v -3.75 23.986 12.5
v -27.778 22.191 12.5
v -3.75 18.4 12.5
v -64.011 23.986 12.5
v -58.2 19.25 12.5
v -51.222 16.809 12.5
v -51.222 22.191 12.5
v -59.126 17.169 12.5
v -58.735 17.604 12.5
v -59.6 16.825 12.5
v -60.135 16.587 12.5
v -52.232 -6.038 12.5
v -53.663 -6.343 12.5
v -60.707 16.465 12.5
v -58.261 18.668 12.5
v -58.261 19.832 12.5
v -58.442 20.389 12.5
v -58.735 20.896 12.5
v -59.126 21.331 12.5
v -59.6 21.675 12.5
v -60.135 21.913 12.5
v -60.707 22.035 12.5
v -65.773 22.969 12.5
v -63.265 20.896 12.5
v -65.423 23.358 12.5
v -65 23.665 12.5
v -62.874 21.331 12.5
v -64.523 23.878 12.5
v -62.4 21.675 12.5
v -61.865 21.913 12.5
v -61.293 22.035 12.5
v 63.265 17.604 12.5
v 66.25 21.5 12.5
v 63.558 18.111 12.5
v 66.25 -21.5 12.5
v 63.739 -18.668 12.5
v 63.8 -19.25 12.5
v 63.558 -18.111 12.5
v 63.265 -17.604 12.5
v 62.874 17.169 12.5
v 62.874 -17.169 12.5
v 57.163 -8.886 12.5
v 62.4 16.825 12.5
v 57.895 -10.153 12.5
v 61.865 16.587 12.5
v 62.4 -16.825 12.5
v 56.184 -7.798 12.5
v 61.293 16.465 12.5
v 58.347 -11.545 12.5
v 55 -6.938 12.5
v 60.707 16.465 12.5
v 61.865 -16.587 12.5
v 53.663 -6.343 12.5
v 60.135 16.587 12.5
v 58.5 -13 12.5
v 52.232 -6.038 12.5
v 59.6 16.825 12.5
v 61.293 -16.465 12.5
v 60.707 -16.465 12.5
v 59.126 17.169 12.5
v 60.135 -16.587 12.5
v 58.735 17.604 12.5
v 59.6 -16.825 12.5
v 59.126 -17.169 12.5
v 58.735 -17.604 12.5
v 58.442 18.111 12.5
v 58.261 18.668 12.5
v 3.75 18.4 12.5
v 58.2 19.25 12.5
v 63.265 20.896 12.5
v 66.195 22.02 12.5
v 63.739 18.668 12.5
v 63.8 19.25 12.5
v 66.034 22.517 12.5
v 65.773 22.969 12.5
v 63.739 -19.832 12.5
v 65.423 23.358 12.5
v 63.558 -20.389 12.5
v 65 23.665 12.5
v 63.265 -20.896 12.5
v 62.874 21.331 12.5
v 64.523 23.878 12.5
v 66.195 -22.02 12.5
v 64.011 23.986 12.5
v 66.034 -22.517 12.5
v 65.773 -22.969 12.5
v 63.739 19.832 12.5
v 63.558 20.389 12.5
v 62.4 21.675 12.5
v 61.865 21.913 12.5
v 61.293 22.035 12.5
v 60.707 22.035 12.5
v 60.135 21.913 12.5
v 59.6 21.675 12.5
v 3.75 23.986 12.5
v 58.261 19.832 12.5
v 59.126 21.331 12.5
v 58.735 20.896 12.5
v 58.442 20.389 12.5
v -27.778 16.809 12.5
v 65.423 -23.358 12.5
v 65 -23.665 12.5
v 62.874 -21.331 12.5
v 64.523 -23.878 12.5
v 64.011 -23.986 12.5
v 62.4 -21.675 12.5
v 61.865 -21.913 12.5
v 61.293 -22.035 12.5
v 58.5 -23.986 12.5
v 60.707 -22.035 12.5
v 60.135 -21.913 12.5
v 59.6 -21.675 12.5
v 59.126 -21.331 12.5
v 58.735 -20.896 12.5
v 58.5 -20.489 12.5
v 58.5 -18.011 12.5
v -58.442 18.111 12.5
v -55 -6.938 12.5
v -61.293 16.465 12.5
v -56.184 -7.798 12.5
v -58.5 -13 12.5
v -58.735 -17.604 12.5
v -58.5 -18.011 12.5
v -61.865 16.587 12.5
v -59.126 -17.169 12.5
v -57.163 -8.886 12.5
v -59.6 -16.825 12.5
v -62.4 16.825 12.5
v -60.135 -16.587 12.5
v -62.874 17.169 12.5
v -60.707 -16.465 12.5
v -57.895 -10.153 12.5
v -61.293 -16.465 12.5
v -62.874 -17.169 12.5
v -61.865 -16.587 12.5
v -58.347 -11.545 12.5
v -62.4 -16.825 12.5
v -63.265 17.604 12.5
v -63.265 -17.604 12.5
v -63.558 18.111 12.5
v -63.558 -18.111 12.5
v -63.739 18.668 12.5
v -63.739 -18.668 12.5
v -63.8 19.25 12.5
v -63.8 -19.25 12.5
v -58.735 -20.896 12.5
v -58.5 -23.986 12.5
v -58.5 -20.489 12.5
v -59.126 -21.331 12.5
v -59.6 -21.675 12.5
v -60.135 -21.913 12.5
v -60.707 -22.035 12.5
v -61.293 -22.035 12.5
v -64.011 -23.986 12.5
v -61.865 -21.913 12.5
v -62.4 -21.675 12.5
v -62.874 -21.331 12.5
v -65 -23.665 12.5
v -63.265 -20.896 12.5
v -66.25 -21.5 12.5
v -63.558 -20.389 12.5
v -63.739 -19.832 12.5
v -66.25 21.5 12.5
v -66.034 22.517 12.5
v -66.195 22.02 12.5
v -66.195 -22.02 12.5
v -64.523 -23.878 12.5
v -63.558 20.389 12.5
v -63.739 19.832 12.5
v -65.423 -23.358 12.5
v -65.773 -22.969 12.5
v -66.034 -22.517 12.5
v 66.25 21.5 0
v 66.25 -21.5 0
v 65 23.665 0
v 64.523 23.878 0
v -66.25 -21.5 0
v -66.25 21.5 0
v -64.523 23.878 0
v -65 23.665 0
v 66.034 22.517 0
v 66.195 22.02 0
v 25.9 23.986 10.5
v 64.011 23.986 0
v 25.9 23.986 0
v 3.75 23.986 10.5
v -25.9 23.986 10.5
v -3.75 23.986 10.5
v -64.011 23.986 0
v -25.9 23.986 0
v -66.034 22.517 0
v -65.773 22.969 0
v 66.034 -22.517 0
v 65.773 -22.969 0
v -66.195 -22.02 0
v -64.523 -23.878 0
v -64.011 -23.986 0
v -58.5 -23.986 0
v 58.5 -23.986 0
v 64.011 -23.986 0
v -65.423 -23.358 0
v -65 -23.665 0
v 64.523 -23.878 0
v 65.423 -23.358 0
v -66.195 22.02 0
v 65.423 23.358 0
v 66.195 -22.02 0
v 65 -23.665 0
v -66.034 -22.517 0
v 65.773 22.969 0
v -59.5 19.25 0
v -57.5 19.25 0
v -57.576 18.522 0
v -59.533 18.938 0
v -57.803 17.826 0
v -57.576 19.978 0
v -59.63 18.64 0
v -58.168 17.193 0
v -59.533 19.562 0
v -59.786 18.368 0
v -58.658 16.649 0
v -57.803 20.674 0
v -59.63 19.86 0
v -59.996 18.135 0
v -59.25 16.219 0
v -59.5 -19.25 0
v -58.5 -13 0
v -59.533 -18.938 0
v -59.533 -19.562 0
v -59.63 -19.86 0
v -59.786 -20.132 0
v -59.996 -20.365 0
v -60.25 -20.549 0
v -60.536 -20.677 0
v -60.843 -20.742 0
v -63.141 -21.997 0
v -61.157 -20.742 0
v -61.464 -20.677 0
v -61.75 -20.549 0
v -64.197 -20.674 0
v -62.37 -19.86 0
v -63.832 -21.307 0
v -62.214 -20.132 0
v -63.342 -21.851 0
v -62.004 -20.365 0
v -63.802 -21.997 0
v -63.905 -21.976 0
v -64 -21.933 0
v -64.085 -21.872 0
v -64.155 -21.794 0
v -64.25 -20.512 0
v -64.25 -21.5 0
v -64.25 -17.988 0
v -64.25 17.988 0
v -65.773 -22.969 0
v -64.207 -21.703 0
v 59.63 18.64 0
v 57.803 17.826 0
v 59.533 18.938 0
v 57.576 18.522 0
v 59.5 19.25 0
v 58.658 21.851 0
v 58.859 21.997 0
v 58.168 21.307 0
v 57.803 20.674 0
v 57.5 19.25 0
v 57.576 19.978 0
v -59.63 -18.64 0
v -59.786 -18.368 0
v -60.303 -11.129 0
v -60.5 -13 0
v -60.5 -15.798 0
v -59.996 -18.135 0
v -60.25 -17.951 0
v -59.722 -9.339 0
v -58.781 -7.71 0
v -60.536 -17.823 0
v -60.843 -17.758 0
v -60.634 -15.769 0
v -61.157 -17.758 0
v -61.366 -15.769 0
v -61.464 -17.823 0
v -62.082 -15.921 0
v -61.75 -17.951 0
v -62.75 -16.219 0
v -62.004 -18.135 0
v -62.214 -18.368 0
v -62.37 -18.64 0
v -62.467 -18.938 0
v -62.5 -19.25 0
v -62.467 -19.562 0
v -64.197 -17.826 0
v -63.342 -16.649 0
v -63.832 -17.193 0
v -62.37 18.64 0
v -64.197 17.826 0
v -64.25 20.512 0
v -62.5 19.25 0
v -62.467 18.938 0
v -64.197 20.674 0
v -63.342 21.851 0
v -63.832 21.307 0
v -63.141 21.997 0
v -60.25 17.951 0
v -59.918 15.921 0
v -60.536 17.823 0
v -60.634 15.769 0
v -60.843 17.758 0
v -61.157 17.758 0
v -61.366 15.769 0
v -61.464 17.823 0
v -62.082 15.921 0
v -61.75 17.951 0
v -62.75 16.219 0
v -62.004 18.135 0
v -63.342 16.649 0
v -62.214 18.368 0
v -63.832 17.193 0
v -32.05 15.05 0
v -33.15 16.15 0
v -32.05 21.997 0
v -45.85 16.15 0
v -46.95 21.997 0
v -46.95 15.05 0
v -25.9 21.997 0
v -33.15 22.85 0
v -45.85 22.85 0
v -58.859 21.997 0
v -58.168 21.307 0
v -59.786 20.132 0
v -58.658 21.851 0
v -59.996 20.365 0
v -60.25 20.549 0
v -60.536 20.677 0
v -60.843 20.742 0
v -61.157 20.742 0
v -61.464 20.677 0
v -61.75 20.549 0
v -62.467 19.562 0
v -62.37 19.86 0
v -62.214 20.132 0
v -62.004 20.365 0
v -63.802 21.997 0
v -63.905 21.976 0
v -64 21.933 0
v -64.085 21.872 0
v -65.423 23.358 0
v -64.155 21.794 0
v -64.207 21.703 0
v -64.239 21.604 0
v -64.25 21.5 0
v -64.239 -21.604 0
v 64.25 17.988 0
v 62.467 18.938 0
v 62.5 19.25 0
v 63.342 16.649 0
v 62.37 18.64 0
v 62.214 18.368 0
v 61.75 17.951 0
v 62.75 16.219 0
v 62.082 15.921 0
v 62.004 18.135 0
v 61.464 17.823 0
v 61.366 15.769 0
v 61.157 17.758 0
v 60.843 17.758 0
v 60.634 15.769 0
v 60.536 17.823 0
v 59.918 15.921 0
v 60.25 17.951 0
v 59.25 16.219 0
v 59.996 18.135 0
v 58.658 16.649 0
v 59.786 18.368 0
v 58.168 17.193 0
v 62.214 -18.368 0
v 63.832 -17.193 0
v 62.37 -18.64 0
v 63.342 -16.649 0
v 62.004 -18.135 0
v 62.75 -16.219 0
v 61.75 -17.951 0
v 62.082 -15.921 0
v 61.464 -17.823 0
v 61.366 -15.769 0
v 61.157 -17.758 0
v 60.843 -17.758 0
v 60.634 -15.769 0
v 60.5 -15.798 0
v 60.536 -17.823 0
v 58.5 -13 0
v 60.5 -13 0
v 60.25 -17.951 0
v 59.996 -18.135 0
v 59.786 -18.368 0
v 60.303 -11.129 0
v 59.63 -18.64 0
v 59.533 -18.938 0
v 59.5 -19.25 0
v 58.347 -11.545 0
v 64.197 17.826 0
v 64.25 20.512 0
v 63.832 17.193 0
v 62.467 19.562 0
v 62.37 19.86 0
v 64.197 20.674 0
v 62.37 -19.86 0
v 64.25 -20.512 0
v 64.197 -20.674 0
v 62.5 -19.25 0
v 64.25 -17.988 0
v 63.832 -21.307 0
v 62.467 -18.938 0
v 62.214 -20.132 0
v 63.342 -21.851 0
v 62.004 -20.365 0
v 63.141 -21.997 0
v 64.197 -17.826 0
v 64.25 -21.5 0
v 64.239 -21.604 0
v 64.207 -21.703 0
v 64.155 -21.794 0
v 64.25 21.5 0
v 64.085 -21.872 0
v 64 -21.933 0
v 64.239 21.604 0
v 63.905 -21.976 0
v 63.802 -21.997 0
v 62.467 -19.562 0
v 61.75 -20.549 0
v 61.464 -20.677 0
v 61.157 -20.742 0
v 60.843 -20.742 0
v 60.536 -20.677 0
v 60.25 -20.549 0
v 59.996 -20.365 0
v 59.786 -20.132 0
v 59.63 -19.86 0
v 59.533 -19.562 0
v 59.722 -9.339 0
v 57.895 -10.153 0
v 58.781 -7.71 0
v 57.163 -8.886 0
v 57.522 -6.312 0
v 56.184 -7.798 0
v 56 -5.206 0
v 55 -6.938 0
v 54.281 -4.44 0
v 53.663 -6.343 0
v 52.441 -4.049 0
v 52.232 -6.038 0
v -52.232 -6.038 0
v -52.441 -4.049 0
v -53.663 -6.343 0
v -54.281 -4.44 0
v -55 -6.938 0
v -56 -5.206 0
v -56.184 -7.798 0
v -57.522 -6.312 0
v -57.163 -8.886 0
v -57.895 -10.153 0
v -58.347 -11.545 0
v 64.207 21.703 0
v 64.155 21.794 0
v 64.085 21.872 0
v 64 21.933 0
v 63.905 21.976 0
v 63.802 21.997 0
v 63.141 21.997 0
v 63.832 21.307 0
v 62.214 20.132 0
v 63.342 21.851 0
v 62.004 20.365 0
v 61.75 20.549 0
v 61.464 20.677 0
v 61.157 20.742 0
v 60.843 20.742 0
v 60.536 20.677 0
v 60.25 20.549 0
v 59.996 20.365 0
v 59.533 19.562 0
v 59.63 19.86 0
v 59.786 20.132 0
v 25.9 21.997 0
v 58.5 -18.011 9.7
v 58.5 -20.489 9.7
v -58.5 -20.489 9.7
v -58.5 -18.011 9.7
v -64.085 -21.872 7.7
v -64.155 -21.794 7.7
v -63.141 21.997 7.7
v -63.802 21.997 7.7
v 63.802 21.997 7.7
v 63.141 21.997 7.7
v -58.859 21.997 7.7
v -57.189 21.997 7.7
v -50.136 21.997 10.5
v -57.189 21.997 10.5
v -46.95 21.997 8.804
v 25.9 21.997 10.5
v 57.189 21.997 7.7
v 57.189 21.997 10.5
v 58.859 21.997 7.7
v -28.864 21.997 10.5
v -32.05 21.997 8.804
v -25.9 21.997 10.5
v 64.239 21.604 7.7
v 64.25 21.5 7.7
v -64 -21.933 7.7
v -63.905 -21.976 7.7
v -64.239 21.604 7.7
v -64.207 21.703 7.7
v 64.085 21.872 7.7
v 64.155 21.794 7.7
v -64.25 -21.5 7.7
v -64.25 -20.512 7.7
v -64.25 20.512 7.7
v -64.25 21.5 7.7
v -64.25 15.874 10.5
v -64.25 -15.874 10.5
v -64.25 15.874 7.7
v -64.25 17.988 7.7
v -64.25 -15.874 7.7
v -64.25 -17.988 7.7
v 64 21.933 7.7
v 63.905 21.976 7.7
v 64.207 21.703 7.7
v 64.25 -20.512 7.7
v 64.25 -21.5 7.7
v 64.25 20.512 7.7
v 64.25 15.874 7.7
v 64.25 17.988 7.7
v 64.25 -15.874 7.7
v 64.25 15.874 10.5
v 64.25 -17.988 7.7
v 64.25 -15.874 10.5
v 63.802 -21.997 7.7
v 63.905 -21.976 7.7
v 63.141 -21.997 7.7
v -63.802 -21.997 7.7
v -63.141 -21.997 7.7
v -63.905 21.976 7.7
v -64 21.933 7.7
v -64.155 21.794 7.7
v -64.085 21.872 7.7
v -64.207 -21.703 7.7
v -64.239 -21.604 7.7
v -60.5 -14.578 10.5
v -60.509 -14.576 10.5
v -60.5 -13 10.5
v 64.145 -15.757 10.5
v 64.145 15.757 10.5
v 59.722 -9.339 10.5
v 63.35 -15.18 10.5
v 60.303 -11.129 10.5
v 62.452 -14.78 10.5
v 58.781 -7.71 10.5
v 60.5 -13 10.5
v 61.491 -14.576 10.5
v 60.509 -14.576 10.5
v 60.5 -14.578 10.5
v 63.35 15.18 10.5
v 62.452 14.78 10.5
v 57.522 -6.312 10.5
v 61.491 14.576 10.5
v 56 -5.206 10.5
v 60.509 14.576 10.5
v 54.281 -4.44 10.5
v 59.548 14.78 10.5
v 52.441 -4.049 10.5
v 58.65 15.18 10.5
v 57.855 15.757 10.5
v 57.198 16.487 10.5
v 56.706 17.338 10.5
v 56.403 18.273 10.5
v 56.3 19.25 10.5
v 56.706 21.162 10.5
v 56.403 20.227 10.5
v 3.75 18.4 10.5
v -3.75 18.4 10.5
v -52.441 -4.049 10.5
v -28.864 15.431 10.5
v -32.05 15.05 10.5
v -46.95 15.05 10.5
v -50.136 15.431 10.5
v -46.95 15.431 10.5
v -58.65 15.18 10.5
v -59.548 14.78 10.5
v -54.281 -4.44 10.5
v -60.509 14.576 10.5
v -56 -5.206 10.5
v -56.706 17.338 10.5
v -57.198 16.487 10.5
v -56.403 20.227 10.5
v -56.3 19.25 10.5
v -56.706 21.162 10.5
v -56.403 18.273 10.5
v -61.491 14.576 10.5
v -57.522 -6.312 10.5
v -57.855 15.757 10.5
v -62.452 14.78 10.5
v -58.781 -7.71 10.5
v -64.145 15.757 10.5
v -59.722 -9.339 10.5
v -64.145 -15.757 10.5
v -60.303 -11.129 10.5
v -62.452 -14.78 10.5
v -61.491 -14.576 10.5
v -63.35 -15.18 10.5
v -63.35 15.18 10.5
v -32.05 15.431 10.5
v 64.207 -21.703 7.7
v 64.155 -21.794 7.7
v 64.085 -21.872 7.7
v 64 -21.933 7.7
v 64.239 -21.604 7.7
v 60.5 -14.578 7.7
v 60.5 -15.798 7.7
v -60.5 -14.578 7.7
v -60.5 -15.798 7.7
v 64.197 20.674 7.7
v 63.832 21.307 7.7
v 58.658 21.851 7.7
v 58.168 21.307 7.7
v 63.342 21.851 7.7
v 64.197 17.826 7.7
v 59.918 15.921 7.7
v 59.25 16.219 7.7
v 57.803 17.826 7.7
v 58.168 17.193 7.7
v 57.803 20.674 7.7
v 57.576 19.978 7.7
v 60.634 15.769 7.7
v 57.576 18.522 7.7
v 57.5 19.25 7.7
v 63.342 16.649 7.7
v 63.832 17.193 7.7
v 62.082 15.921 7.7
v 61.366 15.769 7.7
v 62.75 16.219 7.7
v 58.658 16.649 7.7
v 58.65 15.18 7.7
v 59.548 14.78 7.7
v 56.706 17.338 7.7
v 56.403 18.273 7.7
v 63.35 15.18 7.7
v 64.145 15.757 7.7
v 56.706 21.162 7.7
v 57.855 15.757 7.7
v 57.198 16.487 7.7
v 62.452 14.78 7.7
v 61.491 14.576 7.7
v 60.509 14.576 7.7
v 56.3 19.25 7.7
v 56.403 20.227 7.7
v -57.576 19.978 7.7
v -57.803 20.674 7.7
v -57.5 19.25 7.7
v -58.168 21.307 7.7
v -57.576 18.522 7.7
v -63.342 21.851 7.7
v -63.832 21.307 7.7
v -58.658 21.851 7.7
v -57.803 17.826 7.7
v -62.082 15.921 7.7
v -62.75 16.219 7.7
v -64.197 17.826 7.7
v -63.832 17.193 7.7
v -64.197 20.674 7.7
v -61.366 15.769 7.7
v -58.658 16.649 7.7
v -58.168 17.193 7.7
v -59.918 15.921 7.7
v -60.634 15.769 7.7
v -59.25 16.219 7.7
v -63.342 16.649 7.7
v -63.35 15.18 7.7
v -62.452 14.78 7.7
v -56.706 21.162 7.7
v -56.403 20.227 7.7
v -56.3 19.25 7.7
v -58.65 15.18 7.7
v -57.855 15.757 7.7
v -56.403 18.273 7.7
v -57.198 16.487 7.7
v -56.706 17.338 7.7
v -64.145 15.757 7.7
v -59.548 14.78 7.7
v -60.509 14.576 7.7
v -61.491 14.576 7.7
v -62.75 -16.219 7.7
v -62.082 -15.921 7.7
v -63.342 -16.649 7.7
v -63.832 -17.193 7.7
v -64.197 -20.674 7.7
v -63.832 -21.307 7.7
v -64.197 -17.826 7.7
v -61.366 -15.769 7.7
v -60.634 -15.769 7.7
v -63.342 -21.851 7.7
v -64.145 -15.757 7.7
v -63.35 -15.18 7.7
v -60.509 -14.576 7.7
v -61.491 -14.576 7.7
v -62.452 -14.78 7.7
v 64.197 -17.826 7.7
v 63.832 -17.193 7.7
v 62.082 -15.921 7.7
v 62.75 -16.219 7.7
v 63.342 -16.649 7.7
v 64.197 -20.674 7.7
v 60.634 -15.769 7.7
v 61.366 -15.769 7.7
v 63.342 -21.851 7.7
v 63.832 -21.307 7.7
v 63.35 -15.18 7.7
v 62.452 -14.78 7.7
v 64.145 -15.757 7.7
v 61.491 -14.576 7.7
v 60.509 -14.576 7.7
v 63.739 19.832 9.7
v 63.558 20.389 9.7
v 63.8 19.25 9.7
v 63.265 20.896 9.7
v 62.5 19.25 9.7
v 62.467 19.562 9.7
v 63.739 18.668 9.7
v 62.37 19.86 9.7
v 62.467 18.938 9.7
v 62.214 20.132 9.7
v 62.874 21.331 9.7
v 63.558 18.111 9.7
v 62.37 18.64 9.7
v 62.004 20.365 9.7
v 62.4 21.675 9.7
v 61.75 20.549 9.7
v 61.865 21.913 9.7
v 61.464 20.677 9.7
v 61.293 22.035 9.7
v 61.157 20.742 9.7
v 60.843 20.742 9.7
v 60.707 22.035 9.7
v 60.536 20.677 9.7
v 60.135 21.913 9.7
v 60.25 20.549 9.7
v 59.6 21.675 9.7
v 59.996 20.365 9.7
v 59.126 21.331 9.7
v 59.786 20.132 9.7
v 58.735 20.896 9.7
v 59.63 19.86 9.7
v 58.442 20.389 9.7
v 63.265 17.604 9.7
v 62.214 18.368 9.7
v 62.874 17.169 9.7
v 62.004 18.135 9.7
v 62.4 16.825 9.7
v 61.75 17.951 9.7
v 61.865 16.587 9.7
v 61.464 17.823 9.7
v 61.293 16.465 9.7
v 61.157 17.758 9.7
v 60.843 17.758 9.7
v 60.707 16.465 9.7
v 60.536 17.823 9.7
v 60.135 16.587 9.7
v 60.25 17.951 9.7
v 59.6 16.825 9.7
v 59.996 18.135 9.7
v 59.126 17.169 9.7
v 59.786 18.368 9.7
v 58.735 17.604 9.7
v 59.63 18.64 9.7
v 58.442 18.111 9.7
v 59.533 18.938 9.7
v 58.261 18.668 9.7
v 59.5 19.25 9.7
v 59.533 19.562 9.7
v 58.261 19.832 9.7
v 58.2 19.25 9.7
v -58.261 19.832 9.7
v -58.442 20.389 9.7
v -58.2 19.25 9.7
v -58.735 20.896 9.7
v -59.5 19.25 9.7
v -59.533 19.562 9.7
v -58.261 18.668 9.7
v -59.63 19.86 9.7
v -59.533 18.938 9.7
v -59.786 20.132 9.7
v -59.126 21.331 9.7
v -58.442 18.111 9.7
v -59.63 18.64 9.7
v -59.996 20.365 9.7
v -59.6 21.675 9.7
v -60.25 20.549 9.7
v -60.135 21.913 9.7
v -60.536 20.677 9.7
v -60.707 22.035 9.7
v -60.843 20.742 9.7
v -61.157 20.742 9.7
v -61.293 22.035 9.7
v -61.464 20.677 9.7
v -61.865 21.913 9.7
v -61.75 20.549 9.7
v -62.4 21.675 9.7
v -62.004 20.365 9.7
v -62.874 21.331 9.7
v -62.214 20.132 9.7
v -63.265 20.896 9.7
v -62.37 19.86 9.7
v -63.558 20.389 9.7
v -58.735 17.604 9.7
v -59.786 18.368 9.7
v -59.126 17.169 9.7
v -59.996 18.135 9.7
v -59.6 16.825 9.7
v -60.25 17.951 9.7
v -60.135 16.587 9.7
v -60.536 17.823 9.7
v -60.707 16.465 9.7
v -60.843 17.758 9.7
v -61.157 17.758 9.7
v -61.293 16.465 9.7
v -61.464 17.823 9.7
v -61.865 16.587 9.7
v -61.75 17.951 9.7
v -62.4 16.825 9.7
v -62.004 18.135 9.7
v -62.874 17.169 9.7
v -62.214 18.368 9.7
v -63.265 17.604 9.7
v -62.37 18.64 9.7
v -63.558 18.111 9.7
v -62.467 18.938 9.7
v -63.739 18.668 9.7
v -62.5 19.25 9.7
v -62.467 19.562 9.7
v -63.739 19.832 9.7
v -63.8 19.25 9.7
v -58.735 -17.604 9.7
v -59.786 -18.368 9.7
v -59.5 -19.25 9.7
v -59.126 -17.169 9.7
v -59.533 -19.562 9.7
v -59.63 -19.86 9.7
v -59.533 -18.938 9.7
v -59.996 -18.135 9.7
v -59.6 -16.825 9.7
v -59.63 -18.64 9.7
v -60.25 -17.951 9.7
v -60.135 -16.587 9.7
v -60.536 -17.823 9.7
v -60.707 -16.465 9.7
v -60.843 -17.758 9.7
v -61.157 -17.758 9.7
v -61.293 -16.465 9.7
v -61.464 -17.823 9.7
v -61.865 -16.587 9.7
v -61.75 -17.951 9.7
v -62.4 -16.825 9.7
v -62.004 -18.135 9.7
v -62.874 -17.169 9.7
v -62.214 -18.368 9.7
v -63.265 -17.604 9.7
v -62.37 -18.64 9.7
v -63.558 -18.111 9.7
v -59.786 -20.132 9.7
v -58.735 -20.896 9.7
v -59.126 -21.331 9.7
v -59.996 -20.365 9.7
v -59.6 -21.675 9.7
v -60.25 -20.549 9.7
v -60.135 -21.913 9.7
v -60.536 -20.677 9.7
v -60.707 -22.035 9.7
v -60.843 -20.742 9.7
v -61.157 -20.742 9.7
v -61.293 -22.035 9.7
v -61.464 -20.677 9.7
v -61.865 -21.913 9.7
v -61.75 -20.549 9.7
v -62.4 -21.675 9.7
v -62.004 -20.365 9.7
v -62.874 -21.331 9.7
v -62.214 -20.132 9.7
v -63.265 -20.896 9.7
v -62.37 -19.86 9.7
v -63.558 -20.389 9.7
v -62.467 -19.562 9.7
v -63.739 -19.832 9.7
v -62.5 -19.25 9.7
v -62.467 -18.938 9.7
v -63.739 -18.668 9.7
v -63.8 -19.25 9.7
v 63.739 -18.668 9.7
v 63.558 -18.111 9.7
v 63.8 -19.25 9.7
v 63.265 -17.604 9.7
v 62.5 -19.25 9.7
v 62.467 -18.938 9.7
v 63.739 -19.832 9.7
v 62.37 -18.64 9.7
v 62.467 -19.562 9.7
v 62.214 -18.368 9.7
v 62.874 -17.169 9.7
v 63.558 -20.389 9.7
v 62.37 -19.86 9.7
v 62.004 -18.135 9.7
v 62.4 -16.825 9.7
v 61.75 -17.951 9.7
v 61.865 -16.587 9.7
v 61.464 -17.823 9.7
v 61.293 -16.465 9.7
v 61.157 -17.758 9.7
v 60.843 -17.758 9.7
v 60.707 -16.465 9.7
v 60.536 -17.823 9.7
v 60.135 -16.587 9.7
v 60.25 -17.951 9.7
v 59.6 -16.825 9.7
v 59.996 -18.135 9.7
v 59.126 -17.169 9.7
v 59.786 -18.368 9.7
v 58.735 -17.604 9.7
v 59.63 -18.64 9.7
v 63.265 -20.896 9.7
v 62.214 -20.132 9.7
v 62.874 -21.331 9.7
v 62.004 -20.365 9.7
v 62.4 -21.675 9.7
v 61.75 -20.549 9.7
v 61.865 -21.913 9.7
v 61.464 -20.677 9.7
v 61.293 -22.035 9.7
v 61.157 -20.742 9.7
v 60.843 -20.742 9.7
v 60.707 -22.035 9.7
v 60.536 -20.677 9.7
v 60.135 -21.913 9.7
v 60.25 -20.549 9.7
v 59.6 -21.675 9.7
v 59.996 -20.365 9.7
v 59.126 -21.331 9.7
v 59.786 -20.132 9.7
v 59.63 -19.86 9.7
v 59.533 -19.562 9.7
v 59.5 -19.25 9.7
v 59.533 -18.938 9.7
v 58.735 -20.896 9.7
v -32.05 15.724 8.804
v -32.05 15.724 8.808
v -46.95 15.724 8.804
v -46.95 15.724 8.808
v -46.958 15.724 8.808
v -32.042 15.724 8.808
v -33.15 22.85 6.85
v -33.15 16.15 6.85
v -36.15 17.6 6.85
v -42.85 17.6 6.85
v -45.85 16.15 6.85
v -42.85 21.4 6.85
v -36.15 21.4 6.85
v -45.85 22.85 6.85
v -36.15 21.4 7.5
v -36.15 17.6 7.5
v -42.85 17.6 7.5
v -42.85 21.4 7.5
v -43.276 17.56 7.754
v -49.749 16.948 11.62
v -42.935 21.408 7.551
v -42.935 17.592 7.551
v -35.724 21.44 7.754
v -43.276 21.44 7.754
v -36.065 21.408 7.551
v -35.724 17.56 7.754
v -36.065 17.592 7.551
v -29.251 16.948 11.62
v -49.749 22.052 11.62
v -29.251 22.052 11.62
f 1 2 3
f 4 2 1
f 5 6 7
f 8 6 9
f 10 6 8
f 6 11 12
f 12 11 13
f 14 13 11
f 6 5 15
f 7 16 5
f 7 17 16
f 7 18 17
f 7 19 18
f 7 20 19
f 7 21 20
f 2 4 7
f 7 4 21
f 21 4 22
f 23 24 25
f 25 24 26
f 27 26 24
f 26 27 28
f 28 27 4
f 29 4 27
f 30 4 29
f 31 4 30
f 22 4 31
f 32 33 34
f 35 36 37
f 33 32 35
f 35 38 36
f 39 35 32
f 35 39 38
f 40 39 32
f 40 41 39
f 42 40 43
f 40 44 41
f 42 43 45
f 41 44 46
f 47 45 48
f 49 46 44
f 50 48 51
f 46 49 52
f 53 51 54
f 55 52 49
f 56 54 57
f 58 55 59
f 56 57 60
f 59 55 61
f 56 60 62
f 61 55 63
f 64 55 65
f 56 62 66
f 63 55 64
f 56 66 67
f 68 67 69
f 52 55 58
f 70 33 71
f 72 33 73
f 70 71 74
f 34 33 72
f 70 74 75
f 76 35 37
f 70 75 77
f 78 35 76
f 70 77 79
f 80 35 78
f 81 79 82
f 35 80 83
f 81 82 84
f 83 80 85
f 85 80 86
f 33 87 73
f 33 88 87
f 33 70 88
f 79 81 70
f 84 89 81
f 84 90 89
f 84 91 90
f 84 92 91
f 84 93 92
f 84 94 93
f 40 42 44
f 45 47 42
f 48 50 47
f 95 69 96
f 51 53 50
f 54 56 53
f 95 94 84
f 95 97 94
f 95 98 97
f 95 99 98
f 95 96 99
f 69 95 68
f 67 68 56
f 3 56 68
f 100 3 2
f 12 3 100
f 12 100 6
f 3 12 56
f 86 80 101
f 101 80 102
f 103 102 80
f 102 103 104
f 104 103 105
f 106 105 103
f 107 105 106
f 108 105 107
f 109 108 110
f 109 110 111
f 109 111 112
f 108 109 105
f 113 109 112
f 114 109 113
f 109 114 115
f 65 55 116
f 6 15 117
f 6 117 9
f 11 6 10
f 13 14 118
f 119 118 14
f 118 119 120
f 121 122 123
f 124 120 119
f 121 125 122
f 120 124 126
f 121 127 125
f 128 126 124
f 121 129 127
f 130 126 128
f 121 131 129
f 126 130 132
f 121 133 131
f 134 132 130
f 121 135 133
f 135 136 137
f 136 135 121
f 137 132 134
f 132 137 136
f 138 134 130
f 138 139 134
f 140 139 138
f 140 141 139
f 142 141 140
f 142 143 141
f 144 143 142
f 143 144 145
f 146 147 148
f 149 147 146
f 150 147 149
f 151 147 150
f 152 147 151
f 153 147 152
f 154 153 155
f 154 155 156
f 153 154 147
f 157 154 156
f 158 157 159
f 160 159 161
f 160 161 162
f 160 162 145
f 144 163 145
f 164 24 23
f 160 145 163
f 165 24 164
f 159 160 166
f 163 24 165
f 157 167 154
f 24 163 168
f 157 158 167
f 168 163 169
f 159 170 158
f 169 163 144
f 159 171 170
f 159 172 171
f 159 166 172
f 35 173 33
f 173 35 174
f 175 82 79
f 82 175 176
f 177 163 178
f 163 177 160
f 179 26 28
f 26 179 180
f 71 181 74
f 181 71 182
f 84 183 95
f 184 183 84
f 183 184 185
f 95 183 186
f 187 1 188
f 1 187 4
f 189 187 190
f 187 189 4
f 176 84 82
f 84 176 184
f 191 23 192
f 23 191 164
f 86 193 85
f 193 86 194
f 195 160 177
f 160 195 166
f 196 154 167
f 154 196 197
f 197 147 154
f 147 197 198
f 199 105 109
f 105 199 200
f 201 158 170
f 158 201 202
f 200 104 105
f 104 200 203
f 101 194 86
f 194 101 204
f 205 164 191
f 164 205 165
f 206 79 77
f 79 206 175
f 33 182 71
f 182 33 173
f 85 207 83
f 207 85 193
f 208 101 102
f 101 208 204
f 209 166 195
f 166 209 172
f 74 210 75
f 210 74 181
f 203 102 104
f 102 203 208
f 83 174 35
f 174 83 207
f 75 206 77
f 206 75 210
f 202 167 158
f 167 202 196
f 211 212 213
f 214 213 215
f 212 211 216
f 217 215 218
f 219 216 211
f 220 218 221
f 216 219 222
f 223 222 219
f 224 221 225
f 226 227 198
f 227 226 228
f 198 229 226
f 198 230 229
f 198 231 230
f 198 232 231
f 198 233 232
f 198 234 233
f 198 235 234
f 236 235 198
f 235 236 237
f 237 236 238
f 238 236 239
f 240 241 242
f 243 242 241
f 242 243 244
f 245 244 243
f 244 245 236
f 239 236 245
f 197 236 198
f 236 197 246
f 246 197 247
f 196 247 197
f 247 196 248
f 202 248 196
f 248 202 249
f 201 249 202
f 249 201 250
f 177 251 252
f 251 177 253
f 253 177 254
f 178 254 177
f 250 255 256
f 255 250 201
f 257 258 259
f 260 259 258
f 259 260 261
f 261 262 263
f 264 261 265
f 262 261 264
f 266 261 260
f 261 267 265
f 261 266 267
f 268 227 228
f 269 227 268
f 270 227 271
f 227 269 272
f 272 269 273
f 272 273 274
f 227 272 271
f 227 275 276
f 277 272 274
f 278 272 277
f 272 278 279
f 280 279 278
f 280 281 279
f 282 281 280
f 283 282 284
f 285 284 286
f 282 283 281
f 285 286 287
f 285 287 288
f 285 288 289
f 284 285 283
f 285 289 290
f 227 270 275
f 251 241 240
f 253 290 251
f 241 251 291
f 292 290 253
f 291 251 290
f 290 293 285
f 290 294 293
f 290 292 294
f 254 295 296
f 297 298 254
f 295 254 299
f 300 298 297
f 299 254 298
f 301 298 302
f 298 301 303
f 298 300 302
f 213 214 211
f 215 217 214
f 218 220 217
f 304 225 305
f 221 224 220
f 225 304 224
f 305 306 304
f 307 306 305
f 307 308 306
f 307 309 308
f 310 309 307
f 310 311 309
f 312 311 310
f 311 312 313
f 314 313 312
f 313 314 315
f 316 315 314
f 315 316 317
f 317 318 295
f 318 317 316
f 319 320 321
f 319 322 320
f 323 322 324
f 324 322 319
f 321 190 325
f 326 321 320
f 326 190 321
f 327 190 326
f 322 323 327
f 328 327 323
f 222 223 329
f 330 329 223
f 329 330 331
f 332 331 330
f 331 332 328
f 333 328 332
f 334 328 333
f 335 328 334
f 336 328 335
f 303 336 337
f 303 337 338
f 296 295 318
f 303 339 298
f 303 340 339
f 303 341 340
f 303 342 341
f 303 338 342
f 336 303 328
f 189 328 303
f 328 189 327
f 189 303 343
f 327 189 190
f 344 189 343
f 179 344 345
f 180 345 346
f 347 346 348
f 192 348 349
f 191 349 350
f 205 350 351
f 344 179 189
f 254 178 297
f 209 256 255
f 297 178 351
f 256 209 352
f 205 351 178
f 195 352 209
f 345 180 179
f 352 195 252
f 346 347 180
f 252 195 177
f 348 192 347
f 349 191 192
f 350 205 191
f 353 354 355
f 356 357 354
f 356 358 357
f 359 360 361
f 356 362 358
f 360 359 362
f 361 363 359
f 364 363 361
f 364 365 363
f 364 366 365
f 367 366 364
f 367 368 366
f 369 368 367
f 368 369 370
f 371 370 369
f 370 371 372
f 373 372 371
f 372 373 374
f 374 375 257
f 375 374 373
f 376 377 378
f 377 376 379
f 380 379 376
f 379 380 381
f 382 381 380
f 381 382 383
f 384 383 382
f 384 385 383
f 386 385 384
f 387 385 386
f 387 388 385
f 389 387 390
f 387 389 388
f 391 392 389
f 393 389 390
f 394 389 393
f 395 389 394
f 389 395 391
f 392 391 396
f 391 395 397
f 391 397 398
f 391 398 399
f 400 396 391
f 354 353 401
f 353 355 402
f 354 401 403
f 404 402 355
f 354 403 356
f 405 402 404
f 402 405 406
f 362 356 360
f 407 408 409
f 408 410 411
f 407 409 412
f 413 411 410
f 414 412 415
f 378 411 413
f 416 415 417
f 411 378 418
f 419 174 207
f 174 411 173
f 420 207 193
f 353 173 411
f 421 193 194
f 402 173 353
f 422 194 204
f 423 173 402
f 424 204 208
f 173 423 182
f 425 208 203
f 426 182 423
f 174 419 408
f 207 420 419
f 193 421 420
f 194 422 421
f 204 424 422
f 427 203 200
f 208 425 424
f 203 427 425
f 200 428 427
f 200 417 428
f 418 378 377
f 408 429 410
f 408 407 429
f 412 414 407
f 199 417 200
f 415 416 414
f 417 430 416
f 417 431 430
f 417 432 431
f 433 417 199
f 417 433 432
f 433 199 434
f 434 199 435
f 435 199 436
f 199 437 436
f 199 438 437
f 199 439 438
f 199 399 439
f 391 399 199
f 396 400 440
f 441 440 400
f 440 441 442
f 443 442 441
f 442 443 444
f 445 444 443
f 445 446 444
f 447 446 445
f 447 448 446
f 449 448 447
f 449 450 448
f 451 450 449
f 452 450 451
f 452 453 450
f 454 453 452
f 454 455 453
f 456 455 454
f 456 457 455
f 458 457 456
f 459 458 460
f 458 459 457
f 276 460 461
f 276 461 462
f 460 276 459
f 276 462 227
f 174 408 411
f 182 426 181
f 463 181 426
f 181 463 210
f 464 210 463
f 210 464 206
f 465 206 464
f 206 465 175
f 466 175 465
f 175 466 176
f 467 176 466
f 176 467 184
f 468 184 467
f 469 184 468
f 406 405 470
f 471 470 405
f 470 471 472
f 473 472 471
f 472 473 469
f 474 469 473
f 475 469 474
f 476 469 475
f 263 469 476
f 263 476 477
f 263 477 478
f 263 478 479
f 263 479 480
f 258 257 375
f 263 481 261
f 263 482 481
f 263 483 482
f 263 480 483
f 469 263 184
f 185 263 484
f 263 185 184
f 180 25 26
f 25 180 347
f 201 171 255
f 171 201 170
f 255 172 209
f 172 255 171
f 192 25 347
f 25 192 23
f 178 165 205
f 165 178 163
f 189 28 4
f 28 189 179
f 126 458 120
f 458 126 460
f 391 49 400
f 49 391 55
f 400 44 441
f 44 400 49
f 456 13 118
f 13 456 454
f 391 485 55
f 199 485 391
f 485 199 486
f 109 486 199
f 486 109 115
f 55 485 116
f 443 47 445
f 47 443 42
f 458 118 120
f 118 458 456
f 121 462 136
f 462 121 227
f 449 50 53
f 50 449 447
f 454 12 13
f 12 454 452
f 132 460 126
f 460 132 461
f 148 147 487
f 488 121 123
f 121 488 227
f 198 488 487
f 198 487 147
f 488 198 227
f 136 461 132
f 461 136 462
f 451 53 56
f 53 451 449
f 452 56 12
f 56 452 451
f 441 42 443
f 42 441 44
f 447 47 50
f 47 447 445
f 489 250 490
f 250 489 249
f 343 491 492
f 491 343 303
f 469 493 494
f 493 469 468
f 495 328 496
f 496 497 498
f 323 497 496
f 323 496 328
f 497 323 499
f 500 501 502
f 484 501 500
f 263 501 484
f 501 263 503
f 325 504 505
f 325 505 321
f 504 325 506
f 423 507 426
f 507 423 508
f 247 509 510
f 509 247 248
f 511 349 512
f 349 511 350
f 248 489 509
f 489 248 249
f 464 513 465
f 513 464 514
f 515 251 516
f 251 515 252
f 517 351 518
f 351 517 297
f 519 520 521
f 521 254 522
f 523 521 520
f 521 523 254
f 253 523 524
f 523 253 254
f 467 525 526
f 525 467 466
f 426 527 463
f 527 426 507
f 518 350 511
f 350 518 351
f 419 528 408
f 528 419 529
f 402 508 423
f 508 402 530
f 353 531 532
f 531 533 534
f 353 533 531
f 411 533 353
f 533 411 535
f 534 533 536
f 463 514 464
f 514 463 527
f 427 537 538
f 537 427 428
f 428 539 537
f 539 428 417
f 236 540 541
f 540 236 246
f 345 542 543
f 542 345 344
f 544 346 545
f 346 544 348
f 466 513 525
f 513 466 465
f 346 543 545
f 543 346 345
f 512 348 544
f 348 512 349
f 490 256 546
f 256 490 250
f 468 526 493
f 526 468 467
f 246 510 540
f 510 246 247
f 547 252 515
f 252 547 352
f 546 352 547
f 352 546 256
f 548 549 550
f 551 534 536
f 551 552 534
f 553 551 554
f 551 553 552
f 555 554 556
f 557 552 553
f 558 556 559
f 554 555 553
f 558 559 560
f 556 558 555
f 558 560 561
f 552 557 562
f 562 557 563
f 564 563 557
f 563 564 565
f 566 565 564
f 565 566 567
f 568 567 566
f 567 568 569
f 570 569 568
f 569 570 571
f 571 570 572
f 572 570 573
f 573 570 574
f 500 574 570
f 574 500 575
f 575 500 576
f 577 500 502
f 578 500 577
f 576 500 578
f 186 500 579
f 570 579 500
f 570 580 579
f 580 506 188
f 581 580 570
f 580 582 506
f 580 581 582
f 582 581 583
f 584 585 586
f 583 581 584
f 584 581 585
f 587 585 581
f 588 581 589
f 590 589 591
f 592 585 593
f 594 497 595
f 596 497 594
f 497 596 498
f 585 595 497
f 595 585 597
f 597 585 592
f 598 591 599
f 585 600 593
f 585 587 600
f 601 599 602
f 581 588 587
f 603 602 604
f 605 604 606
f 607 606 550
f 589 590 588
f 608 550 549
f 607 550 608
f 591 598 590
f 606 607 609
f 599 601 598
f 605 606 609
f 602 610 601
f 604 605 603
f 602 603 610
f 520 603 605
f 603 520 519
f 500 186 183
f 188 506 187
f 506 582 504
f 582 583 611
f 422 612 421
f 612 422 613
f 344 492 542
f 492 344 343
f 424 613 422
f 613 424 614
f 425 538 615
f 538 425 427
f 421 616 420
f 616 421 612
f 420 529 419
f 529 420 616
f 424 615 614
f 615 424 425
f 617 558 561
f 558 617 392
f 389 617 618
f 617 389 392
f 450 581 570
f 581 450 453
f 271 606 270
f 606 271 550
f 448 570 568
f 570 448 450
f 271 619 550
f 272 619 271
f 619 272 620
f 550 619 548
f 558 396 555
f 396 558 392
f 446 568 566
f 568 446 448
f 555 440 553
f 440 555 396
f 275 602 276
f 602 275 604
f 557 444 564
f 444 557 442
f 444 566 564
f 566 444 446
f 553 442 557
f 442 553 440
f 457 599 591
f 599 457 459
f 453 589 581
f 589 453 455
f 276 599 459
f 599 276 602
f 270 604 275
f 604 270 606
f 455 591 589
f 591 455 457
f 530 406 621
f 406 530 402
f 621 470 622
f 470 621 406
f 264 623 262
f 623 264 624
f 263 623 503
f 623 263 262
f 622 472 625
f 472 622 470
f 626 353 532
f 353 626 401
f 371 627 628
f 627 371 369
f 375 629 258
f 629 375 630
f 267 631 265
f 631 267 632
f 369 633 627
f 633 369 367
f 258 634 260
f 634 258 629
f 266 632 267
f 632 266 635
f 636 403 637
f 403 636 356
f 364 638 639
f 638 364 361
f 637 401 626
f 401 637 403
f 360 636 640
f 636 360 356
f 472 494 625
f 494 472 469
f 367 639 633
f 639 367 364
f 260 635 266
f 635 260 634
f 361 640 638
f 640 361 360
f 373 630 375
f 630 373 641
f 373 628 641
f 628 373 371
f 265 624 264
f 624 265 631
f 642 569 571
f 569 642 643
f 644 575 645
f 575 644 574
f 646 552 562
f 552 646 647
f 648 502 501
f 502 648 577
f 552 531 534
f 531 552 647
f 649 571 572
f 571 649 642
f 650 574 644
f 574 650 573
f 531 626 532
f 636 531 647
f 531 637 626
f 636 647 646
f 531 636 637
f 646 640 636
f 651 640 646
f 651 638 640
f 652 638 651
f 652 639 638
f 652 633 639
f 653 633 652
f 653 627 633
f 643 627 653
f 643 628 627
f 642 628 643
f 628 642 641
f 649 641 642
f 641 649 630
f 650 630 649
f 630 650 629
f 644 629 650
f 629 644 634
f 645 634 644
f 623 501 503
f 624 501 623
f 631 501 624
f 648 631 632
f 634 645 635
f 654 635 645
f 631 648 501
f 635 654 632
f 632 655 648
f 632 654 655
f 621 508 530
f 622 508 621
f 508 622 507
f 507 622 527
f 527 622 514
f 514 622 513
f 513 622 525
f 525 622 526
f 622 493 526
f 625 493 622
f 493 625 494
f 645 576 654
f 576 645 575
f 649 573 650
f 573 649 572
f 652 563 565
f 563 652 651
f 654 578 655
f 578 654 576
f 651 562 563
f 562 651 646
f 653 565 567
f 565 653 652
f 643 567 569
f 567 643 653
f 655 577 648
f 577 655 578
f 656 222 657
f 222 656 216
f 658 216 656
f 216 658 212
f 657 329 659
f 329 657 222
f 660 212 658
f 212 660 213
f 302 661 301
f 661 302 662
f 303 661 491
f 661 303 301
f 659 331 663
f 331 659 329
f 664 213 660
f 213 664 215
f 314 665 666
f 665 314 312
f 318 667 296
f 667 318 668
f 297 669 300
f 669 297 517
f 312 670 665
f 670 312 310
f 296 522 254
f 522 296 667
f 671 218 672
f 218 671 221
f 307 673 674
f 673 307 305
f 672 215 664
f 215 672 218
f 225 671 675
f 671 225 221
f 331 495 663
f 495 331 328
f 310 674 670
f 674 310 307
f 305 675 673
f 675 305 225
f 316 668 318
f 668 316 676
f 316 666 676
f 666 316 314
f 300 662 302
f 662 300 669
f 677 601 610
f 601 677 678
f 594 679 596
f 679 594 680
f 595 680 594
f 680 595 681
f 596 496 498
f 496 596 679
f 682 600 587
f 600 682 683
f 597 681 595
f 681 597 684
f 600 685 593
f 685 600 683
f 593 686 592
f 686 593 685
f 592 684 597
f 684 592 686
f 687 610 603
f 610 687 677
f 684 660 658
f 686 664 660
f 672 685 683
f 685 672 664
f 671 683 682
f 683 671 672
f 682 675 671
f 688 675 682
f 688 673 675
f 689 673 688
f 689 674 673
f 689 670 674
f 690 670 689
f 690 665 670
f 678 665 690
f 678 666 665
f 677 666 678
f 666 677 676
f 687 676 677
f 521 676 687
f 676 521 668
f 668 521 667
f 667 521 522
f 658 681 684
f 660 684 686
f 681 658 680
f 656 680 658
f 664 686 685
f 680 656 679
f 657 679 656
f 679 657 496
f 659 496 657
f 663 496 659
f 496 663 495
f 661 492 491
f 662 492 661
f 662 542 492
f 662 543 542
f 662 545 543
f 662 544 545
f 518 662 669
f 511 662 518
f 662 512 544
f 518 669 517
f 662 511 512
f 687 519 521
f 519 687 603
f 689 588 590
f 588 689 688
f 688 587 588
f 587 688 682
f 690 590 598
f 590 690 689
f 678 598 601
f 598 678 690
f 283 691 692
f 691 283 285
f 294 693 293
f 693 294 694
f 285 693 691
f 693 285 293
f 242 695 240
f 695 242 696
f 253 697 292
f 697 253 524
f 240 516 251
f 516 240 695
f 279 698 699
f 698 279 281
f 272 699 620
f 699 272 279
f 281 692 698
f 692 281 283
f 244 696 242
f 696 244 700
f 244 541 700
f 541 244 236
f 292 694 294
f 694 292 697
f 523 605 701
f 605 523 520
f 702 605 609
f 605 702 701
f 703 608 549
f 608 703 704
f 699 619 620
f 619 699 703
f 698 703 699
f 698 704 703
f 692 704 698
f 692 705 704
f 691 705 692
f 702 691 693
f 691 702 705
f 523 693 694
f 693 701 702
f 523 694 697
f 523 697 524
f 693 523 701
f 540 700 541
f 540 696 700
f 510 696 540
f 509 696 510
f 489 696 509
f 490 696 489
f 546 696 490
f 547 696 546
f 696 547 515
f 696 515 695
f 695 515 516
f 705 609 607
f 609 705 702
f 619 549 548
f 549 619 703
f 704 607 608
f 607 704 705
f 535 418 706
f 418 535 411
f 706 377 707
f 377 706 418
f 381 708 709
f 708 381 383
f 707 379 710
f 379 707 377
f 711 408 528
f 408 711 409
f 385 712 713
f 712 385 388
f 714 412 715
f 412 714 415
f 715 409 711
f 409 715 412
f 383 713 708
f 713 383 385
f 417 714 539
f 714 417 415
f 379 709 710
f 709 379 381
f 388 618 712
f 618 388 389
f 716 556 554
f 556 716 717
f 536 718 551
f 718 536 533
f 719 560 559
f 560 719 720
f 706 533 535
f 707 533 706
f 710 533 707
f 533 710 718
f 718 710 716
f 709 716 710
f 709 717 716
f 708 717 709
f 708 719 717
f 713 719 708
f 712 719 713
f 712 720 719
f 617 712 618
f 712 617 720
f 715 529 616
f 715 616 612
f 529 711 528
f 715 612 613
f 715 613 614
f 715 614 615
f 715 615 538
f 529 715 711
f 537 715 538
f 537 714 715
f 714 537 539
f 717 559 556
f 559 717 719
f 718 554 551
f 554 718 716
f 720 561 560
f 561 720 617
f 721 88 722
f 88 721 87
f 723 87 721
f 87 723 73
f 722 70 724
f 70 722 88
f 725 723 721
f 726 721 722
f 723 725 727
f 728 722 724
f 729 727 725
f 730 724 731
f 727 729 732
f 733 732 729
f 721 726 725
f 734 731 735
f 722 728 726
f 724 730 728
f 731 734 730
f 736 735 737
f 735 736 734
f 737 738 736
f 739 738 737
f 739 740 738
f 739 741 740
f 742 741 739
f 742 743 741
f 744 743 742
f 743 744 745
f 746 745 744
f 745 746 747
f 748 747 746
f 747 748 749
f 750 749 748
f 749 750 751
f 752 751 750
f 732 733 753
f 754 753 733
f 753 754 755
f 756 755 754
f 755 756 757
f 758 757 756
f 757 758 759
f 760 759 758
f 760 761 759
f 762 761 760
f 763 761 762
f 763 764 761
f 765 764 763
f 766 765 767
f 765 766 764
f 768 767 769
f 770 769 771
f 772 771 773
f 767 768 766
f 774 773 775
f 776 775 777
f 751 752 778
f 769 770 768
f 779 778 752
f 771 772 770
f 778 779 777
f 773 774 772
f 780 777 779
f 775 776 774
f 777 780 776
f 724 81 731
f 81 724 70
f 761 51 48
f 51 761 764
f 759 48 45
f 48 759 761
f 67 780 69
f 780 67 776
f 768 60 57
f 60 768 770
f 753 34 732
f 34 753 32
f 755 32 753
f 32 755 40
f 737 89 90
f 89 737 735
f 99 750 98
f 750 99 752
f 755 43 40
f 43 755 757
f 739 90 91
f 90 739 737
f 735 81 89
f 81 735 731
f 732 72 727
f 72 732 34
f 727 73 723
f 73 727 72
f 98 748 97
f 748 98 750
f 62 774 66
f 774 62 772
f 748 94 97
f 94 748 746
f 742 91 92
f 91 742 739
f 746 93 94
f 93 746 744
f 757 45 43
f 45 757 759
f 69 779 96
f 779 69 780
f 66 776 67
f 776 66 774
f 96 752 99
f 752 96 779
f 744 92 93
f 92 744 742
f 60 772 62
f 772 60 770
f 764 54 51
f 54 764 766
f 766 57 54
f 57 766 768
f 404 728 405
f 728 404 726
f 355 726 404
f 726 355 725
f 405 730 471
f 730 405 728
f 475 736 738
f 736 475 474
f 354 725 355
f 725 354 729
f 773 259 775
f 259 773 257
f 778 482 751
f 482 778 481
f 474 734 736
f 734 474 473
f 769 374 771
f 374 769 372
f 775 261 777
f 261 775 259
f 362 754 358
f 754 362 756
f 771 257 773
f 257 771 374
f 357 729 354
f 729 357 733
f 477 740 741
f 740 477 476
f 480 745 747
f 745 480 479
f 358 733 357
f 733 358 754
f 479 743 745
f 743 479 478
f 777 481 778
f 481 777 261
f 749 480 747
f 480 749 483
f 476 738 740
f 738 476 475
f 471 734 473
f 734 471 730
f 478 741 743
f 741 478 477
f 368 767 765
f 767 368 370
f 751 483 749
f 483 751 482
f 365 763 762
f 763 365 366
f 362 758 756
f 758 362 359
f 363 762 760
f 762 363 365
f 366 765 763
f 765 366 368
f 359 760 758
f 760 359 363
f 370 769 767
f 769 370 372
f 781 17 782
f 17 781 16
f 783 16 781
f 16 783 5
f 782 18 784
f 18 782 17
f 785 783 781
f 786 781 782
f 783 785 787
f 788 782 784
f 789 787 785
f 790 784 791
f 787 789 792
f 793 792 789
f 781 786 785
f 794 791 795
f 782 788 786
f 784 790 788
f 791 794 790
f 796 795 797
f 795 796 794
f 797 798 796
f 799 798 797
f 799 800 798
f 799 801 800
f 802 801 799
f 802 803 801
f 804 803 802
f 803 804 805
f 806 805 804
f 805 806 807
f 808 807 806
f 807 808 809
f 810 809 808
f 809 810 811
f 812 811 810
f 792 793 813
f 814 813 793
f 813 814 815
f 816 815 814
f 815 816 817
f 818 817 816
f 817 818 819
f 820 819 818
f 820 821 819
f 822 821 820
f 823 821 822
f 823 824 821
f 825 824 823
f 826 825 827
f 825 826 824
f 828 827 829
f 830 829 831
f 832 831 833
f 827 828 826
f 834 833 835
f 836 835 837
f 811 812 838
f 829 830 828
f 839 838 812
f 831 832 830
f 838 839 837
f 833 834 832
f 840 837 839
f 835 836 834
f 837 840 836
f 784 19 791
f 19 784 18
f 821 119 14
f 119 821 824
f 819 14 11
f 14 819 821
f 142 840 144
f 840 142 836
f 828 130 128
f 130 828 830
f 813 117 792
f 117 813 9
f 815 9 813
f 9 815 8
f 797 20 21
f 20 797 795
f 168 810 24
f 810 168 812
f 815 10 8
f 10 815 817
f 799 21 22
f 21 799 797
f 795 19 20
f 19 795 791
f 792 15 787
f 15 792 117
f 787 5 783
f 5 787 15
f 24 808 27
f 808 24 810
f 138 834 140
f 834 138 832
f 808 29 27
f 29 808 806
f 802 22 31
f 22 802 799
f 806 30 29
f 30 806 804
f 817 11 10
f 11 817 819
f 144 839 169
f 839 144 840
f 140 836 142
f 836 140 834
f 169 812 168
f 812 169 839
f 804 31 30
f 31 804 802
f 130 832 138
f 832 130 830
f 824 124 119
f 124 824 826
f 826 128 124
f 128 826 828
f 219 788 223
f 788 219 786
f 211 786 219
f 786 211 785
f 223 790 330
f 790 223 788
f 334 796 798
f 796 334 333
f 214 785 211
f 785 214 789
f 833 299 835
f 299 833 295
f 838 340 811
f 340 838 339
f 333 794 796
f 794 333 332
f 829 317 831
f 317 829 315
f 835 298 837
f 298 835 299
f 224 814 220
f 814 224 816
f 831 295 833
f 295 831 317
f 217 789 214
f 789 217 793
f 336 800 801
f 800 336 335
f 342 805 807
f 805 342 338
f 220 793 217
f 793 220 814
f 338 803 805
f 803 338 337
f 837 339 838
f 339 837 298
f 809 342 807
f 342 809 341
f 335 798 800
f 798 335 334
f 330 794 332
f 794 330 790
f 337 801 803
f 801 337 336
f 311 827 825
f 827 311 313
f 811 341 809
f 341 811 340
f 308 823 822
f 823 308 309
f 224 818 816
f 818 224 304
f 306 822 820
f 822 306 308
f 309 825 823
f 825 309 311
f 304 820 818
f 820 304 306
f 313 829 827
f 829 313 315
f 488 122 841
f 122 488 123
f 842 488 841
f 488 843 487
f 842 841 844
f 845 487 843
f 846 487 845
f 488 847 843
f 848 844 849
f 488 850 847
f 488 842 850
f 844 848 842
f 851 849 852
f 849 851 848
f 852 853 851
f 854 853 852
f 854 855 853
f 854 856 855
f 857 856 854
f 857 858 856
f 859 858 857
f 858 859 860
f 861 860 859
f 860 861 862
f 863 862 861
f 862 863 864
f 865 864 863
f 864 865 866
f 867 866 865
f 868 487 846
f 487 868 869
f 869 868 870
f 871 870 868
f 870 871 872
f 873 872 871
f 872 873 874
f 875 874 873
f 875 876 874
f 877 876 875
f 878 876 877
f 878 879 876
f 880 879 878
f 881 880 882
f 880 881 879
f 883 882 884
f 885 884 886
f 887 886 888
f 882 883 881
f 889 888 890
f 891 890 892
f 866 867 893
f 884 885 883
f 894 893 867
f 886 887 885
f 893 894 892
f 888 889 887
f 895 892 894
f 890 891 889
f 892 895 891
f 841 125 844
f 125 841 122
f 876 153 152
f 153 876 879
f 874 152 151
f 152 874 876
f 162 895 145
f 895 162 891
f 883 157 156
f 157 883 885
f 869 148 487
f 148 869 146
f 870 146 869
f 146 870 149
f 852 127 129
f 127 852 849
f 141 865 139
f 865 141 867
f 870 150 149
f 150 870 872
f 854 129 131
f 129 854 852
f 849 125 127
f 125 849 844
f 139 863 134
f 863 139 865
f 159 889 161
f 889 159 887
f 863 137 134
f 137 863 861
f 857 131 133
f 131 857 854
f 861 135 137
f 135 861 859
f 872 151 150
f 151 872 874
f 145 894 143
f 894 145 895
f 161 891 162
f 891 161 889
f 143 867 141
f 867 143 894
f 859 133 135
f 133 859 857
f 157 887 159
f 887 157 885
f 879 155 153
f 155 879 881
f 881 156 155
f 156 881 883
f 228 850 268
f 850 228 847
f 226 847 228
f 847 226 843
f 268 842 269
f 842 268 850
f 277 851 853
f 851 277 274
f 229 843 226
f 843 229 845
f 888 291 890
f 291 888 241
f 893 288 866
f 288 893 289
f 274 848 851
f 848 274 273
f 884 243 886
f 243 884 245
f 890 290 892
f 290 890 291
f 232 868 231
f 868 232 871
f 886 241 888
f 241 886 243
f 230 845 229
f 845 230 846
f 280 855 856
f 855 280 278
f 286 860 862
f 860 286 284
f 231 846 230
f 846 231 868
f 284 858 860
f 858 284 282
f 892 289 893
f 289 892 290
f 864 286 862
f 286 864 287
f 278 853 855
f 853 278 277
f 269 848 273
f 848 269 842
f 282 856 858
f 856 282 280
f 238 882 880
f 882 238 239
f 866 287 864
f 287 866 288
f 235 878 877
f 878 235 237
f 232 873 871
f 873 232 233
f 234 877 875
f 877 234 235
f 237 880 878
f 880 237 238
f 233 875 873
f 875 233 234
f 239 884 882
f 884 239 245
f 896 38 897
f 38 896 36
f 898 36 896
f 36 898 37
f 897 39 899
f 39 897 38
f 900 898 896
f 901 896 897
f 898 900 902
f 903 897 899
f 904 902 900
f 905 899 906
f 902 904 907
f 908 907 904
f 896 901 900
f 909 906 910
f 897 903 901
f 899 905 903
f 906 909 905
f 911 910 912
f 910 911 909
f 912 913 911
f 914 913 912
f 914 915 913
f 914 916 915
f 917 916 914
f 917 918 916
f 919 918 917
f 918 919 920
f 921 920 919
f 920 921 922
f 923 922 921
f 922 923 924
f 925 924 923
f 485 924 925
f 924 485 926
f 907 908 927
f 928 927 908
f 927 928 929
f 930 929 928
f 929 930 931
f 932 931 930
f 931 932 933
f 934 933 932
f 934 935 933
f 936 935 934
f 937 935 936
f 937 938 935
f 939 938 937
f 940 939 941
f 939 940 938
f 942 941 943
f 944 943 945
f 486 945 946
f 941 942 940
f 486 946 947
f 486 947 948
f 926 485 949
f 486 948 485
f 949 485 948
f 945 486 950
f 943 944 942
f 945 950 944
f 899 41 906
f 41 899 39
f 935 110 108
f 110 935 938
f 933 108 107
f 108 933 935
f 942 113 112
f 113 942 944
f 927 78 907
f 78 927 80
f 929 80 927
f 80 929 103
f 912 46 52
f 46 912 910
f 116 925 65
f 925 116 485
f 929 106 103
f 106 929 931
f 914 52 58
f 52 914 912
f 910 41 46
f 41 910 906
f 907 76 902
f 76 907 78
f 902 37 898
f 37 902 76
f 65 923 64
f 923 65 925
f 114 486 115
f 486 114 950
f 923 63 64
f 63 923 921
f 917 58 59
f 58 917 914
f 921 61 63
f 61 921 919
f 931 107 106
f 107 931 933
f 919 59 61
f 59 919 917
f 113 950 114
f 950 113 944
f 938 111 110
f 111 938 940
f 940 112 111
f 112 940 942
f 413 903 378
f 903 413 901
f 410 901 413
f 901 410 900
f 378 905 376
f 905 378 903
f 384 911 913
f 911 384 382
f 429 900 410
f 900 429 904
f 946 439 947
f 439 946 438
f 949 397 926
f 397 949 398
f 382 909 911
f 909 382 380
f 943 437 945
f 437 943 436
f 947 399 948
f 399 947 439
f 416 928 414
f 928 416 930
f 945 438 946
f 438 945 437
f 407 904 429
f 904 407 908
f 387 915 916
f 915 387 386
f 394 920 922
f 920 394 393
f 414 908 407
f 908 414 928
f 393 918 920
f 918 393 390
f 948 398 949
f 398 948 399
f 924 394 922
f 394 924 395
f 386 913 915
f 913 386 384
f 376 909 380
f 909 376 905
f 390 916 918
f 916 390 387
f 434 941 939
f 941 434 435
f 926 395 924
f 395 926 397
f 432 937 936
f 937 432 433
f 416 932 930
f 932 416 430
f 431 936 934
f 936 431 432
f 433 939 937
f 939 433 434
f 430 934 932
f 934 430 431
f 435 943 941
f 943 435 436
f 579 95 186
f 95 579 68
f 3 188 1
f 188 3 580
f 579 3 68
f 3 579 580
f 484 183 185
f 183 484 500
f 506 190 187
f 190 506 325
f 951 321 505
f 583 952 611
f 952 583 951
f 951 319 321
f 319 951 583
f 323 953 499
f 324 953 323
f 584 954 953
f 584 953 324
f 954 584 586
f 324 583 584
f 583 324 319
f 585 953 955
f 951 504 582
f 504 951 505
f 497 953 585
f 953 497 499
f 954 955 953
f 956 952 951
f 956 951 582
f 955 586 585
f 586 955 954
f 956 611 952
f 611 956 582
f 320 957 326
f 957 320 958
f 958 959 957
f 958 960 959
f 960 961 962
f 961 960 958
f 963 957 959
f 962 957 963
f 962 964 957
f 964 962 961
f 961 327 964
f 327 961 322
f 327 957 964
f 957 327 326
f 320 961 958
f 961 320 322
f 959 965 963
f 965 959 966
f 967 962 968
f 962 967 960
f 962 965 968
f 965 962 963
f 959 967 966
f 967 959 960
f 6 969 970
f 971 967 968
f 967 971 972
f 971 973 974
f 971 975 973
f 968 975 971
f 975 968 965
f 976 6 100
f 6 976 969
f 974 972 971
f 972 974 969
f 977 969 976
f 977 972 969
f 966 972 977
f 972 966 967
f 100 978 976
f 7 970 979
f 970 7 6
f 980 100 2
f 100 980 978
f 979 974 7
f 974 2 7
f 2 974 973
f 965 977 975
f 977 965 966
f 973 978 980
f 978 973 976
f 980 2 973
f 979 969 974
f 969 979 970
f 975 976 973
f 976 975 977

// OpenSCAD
// file: benchtop_power_common.scad
corner_radius = 2.5;
board_size = [132.5, 48];
bolt_distance = [122, 38.5];

switch_position=[-39.5,19.5,0];

terminal_count = 8;
terminal_spacing = 103/(terminal_count-1);

$fs = 0.1;

board_corners = [[board_size[0]/2-corner_radius,board_size[1]/2-corner_radius,0],
                [-board_size[0]/2+corner_radius,board_size[1]/2-corner_radius,0],
                [-board_size[0]/2+corner_radius,-board_size[1]/2+corner_radius,0],
                 [board_size[0]/2-corner_radius,-board_size[1]/2+corner_radius,0]];
bolts_pos = [[bolt_distance[0]/2,bolt_distance[1]/2,0],
            [-bolt_distance[0]/2,bolt_distance[1]/2,0],
            [-bolt_distance[0]/2,-bolt_distance[1]/2,0],
             [bolt_distance[0]/2,-bolt_distance[1]/2,0]];
// main file
include <benchtop_power_common.scad>

tolerance=0.7;
bolt_diam=3;
bolt_head_height=2.8;
bolt_head_r=5.6/2;
cover_clearance = 10.5;
cover_thickness = 2;
led_window_thickness = 0.1;//set to 0 to make a hole
switch_body=[12,6,6.5];
switch_lever=[6,3.1,5];
            
module standoff(D_o=bolt_diam/2+cover_thickness, h=cover_clearance+cover_thickness){
    cylinder(h=h,r=D_o, center=false);
    translate([0,0,h-bolt_head_height-2])
    cylinder(h=bolt_head_height+2, r=bolt_head_r+cover_thickness-0.1, center=false);
}

module standoffs(){
    for (i=bolts_pos){
        translate(i)
        standoff();
     }
}

module bolt_top(shank=bolt_diam, head=bolt_head_r){
    cylinder(r=head,h=bolt_head_height+0.1, center=false);
    translate([0,0,-(cover_clearance+cover_thickness)+0.1])
    cylinder(r=shank/2, h=cover_clearance+cover_thickness,center=false);
}

module bolts_top(){
    translate([0,0,cover_clearance+cover_thickness-bolt_head_height])
    for(i=bolts_pos){
        translate(i)bolt_top();
    }
}

module put_switch(expansion=[4,1.5],position=switch_position){
    extrusion_h=cover_clearance+cover_thickness/2-switch_body[2];
    wall_thickness=1.45;
    difference(){
        union(){
            children();
            translate([0,0,cover_clearance/2]+position)
            cube([switch_body[0]+wall_thickness*2,
                  switch_body[1]+wall_thickness*2,cover_clearance],center=true);
            translate([0,0,switch_body[2]+cover_thickness/2]+position)
            linear_extrude(height=extrusion_h, 
                scale=[(expansion[0]*(switch_lever[0]+tolerance)+cover_thickness*2)/
                                     (switch_lever[0]+tolerance+cover_thickness*2),
                       (expansion[1]*(switch_lever[1]+tolerance)+cover_thickness*2)/
                                     (switch_lever[1]+tolerance+cover_thickness*2)])
                square([switch_lever[0]+cover_thickness*2,
                        switch_lever[1]+cover_thickness*2], center=true);
        }
        union(){
            translate([0,0,switch_body[2]/2]+position)
            cube(switch_body+[tolerance,tolerance,tolerance],center=true);
            translate([0,0,switch_body[2]+switch_lever[2]/2]+position)
            cube(switch_lever+[tolerance,tolerance,tolerance],center=true);
            translate([0,0,switch_body[2]+cover_thickness/2]+position)
            linear_extrude(height=cover_clearance-switch_body[2]+cover_thickness+.002, 
                            scale=expansion)
            square([switch_lever[0]+tolerance,switch_lever[1]+tolerance], center=true);
        }
    }
}
//projection(cut=true)
//rotate([90,0,0])
//put_switch();
module atx(){
    translate([0,board_size[1]/2-13,0]){
        translate([-7.5/2,13-5.6,10.5])
        cube([7.5,5.6,5], center=false);
        translate([-51.8/2,0,0])
        cube([51.8, 13, 10.5], center=false);
    }
}

module notch(wall_thickness=corner_radius){
    hull()
        for(i=[[-103/2,-13,-0.1],[103/2,-13,-0.1],[103/2,-13-50,-0.1],[-103/2,-13-50,-0.1]]){
            translate(i)
            cylinder(r=7+(corner_radius-wall_thickness), 
                     h=cover_clearance+cover_thickness+0.2,center=false);
        }
}

module shell(wall_thickness=corner_radius){
    difference(){
        hull()
        for (i=board_corners){
            translate(i)cylinder(r=wall_thickness, 
                                 h=cover_clearance+cover_thickness, center=false);
        }
        notch(wall_thickness=wall_thickness);
    }
}

module cover(){
    difference(){
        shell();
        translate([0,0,-cover_thickness])
        shell(corner_radius-cover_thickness);
    }
    standoffs();
}

module part(){
    difference(){
        cover();
        union(){
            bolts_top();
            notch();
            atx();
        }
    }
}

put_switch()
part();
